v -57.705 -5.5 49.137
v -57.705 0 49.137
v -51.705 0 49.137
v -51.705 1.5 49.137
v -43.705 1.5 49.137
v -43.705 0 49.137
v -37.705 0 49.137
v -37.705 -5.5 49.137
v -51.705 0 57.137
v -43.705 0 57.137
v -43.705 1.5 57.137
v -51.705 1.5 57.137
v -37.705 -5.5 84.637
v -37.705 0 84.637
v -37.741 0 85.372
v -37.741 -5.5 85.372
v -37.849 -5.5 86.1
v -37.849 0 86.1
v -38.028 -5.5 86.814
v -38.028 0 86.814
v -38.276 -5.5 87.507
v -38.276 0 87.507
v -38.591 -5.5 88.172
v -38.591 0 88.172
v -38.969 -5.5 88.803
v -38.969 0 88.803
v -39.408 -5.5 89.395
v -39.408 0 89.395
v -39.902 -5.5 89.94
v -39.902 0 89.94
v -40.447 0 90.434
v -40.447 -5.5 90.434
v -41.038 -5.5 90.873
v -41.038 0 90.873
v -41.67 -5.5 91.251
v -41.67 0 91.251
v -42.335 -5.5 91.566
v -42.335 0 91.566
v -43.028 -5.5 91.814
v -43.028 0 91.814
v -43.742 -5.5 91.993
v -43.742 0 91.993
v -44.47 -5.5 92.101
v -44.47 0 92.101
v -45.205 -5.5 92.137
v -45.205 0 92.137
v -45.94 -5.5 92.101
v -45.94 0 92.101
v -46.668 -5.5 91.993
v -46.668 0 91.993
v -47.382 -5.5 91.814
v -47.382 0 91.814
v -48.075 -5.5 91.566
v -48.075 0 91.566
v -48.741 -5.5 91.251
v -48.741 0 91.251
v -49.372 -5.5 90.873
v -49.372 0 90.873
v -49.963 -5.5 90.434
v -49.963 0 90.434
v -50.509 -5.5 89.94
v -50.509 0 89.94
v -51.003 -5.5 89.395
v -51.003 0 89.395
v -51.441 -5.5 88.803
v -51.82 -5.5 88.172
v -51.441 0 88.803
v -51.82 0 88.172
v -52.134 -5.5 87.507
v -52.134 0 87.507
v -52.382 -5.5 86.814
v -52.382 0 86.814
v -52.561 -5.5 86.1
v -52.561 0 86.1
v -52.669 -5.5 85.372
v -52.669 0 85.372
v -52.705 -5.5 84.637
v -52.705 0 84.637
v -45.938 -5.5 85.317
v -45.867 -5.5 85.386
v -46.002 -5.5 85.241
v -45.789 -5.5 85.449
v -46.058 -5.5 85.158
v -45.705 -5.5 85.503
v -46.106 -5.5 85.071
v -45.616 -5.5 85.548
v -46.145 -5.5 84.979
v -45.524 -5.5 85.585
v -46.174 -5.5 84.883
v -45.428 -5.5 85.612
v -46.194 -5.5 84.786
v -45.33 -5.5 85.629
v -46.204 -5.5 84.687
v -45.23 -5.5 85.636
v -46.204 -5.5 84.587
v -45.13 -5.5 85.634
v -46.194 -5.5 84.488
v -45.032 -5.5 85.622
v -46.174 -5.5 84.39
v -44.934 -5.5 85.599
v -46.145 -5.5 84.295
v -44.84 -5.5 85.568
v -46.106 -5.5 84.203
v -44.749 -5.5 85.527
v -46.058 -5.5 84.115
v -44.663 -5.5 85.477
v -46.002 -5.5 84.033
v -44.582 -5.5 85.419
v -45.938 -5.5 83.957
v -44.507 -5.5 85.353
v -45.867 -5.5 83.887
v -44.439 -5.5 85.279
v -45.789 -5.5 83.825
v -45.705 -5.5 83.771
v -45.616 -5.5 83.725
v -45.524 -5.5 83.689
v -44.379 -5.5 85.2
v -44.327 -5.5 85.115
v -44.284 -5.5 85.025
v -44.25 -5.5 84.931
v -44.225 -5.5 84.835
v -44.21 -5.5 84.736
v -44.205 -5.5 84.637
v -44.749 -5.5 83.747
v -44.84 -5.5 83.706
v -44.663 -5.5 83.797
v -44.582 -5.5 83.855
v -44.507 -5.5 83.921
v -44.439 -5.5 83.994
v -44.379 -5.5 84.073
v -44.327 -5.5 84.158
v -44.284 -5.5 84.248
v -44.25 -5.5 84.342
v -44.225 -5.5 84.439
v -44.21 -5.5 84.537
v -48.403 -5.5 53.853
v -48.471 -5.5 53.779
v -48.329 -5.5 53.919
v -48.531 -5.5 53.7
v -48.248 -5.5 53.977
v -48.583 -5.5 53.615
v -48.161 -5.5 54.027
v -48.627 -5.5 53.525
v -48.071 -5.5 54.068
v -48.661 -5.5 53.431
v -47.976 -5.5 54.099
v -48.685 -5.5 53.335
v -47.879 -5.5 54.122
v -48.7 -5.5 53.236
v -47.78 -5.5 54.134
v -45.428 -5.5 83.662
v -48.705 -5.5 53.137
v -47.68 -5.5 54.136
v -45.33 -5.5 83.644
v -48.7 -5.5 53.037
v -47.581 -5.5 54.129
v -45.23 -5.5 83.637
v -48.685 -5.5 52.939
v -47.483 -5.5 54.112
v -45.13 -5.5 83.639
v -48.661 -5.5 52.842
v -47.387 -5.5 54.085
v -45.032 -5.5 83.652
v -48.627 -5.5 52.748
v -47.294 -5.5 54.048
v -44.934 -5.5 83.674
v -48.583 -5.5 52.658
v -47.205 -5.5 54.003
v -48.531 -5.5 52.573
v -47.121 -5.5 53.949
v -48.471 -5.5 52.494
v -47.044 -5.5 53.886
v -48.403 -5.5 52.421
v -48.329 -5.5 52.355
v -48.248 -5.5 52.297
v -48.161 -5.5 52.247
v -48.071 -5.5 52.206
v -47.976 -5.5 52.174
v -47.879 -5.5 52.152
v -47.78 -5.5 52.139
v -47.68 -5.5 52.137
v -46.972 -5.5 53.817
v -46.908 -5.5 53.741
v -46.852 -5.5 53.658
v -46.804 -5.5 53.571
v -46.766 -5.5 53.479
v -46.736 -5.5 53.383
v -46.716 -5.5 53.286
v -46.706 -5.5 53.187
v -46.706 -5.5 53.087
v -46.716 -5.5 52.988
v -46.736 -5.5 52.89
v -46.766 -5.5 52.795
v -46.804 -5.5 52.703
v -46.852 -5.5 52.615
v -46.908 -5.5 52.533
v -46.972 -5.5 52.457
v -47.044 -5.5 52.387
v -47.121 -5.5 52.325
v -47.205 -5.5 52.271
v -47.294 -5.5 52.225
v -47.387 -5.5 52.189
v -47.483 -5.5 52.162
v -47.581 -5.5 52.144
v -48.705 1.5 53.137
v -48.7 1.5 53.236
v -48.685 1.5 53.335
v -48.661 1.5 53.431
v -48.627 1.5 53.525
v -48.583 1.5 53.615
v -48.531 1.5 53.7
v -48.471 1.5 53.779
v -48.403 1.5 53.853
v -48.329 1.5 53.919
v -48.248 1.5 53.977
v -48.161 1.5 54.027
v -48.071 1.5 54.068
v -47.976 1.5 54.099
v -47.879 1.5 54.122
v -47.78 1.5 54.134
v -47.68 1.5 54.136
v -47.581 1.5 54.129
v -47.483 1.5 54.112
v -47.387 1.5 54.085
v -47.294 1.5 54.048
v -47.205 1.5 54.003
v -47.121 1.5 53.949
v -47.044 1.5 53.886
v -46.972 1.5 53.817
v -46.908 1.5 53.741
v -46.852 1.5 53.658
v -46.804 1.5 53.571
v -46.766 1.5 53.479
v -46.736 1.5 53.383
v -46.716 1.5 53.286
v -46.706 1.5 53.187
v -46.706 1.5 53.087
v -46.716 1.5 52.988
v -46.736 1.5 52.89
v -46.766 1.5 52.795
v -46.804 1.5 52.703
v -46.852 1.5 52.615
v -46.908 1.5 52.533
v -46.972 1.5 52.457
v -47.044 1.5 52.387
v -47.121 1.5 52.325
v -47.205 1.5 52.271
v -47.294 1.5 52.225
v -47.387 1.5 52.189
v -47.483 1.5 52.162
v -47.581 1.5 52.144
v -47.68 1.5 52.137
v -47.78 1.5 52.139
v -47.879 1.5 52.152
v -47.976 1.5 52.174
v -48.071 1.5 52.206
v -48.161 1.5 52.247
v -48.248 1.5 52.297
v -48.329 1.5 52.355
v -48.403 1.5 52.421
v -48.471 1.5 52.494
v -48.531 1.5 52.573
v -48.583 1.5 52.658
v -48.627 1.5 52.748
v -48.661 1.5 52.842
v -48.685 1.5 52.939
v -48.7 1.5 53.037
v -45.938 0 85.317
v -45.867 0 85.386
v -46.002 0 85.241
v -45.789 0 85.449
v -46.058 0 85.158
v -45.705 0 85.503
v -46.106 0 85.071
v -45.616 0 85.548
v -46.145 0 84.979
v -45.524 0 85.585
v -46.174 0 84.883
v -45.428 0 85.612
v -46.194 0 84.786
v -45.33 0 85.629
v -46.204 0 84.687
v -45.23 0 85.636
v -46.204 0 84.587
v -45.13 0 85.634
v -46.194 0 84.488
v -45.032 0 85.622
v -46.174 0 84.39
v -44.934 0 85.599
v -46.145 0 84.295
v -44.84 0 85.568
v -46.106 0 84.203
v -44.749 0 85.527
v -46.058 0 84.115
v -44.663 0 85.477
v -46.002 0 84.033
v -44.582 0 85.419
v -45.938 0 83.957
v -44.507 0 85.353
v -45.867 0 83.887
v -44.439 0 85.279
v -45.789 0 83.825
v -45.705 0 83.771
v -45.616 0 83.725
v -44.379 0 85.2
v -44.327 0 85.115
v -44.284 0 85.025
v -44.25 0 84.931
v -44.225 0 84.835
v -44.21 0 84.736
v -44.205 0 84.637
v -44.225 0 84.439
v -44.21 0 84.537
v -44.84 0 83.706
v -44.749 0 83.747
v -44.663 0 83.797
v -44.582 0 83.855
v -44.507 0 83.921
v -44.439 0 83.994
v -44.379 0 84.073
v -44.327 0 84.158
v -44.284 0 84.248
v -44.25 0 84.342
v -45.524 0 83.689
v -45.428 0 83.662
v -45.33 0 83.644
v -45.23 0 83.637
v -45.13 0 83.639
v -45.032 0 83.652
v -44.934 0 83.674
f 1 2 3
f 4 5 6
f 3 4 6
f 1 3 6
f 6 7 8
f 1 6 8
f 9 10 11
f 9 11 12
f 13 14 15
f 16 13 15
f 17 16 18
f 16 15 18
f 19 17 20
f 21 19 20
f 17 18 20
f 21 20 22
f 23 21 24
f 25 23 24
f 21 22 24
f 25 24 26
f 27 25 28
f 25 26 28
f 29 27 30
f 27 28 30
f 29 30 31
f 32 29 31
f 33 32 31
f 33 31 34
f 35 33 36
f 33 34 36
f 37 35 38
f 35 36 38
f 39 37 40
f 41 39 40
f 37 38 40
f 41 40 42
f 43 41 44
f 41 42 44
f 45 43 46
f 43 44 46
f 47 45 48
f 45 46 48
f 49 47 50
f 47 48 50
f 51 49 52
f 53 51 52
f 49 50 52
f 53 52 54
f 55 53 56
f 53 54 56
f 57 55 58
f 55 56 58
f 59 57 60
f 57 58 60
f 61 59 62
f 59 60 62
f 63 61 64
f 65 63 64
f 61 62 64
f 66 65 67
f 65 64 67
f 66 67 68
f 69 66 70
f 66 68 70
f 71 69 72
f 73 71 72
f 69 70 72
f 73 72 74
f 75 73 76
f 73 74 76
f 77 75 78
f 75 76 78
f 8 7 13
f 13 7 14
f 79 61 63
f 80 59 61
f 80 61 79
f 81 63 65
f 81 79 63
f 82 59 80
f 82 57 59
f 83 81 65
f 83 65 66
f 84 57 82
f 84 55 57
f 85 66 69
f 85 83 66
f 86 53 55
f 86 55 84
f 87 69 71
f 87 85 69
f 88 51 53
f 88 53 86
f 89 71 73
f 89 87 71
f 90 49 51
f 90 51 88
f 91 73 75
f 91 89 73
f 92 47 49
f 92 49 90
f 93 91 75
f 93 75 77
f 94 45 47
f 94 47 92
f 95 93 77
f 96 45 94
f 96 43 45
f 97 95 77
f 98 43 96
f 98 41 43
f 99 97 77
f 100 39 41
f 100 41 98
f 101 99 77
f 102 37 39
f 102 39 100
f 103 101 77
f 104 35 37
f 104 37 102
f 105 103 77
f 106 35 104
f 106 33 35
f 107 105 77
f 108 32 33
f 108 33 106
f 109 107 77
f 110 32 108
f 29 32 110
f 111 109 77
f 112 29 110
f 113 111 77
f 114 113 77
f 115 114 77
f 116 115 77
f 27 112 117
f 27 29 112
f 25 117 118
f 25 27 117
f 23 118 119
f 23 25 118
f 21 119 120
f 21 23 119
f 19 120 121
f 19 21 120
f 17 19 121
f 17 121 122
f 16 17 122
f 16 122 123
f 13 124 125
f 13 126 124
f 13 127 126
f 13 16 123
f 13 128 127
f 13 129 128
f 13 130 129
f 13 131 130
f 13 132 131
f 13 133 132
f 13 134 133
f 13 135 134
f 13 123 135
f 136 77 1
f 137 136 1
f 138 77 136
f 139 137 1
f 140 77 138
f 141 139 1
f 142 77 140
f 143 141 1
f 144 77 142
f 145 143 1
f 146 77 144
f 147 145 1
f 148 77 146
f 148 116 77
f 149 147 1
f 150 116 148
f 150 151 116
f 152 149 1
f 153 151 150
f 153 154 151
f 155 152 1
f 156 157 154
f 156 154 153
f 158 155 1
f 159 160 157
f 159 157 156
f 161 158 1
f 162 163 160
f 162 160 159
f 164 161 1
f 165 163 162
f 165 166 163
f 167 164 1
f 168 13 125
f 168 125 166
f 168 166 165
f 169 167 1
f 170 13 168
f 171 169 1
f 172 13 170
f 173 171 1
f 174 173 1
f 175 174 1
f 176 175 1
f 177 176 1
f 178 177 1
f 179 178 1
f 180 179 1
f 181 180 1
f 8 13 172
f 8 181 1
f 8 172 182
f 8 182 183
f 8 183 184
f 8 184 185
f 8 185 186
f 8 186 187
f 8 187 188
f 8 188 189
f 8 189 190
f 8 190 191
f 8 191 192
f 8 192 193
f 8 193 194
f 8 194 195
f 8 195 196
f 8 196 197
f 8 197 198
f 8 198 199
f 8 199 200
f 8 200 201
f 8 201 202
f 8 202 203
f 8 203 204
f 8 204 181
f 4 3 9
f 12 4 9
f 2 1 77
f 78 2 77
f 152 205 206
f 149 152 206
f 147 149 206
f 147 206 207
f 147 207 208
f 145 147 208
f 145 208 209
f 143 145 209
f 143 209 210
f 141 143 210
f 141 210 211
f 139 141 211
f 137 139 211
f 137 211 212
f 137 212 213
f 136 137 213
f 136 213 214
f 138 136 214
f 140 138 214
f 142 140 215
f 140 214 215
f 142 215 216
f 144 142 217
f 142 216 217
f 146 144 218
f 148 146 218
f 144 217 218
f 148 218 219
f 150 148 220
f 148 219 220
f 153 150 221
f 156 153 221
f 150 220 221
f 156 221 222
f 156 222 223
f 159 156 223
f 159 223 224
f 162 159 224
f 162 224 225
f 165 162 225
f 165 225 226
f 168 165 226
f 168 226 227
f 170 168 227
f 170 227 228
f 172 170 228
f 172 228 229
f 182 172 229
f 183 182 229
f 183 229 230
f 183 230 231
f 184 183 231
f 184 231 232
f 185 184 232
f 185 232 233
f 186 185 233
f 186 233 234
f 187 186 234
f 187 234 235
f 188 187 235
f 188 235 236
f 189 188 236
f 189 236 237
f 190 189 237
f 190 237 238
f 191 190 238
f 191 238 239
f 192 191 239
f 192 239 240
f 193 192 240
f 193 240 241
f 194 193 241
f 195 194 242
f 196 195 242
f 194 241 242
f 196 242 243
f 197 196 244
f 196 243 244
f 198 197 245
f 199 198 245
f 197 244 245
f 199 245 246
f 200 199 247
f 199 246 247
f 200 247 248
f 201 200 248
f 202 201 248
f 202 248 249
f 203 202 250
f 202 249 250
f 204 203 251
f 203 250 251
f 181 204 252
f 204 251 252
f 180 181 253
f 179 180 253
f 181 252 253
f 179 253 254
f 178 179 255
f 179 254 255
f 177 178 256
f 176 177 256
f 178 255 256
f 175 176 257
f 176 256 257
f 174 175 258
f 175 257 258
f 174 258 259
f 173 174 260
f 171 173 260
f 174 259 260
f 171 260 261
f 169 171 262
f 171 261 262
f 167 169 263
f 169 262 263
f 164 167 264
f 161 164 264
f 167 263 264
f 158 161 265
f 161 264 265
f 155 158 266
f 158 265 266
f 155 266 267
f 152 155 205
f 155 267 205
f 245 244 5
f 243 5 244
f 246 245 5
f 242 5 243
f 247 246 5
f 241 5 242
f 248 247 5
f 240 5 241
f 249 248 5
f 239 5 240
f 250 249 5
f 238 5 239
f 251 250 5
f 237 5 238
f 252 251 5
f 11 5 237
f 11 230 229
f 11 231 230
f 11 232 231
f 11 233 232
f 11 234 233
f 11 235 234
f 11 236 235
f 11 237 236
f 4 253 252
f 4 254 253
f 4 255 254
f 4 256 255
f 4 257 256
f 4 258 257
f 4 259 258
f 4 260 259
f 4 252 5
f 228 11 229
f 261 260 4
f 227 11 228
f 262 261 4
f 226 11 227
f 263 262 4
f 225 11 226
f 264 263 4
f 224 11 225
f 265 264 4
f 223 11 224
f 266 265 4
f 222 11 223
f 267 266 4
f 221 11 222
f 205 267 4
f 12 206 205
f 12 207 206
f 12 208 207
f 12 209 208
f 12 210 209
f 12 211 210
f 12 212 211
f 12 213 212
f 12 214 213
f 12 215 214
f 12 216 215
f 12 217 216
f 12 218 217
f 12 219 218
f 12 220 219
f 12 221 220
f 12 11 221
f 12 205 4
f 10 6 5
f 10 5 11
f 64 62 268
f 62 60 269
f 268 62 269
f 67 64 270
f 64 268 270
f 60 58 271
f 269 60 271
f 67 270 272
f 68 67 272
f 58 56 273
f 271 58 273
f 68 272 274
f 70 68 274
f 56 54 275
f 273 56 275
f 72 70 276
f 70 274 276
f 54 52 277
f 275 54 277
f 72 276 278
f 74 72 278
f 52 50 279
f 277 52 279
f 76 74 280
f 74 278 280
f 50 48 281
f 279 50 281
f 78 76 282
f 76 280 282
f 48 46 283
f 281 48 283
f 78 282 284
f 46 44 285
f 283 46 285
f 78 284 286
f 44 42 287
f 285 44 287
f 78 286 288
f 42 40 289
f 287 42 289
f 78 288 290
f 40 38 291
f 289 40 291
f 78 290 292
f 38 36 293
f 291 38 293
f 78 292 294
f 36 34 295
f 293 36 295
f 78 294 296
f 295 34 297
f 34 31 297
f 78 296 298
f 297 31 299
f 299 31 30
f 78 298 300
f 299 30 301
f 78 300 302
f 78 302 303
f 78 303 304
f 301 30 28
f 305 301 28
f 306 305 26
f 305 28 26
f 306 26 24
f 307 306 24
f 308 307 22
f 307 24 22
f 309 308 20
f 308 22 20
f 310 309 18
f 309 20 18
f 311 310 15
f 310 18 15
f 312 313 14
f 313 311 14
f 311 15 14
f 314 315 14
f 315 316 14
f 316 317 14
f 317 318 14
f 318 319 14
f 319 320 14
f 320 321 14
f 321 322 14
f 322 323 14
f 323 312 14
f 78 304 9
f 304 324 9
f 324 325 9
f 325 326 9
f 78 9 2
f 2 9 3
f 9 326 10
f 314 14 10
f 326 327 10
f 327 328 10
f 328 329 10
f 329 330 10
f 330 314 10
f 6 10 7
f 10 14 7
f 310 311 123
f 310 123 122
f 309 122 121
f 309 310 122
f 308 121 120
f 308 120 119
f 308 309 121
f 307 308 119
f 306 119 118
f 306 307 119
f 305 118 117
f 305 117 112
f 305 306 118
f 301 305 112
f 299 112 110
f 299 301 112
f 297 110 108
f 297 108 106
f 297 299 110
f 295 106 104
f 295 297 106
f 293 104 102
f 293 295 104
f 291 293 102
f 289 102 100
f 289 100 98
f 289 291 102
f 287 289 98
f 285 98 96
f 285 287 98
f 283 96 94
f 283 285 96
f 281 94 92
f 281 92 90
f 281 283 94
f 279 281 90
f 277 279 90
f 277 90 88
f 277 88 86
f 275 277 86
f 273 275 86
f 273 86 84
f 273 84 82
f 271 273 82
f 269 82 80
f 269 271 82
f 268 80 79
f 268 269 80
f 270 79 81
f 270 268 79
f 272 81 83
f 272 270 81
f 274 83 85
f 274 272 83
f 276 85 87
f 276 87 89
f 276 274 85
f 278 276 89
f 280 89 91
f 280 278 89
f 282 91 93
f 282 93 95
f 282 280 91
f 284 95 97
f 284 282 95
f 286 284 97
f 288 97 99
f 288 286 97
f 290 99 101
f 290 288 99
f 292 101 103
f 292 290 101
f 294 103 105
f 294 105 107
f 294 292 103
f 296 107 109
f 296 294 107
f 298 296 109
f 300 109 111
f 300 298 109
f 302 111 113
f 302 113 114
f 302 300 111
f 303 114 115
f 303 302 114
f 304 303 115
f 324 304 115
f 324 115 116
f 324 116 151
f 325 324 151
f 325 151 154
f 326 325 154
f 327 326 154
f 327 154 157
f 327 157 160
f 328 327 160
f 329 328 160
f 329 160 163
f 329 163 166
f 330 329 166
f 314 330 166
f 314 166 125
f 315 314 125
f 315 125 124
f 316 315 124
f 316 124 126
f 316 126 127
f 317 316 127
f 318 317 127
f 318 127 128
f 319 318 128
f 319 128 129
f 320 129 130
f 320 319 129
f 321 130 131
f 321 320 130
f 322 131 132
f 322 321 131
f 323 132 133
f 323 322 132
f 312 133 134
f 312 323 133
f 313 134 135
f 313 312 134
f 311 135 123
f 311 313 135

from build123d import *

# Parameters (mm, degrees)
F0_R      = 1
F1_DEPTH  = 5.5
F2_W      = 5.5
F2_H      = 57
F3_DEPTH  = 25
F4_DEPTH  = 5
F6_DEPTH  = 25
F7_W      = 8
F7_H      = 8
F8_DEPTH  = 1.5
F9_R      = 1
F10_DEPTH = 25


with BuildPart() as f1:
    # F0 (on Front) → F1 (new body)
    with BuildSketch(Plane.XZ):
        with BuildLine():
            ThreePointArc((-37.7052051574, 84.6366998268), (-39.9019042985, 89.9400006857), (-45.2052051574, 92.1366998268))
            ThreePointArc((-45.2052051574, 92.1366998268), (-50.5085060163, 89.9400006857), (-52.7052051574, 84.6366998268))
            ThreePointArc((-52.7052051574, 84.6366998268), (-45.2052051574, 77.1366998268), (-37.7052051574, 84.6366998268))
        make_face()
        with Locations((-45.2052051574, 84.6366998268)):
            Circle(F0_R, mode=Mode.SUBTRACT)
        with BuildLine():
            ThreePointArc((-37.7052051574, 84.6366998268), (-45.2052051574, 77.1366998268), (-52.7052051574, 84.6366998268))
            Line((-52.7052051574, 84.6366998268), (-52.7052051574, -7.8633001732))
            Line((-52.7052051574, -7.8633001732), (-37.7052051574, -7.8633001732))
            Line((-37.7052051574, -7.8633001732), (-37.7052051574, 84.6366998268))
        make_face()
    extrude(amount=F1_DEPTH)

    # F2 (on face) → F3 (cut)
    with BuildSketch(Plane(origin=(-52.7052051574, 0, 0), x_dir=(0, -1, 0), z_dir=(-1, 0, 0))):
        with Locations((2.75, 20.6366998268)):
            Rectangle(F2_W, F2_H)
    extrude(amount=-F3_DEPTH, mode=Mode.SUBTRACT)

    # F4 (add): a face of the model
    f4_faces = [f1.faces().sort_by_distance(p)[0] for p in [
        (-52.7052051574, -2.75, 66.8866998268),
    ]]
    extrude(f4_faces, amount=F4_DEPTH)

    # F5 (on face) → F6 (cut)
    with BuildSketch(Plane.XZ.offset(5.5)):
        Polygon((-57.7052051574, 49.1366998268), (-52.7052051574, 84.6366998268), (-57.7052051574, 84.6366998268), align=None)
    extrude(amount=-F6_DEPTH, mode=Mode.SUBTRACT)

    # F7 (on face) → F8 (join)
    with BuildSketch(Plane(origin=(0, 0, 0), x_dir=(-1, 0, 0), z_dir=(0, 1, 0))):
        with Locations((47.7052051574, 53.1366998268)):
            Rectangle(F7_W, F7_H)
    extrude(amount=F8_DEPTH)

    # F9 (on face) → F10 (cut)
    with BuildSketch(Plane(origin=(0, 1.5, 0), x_dir=(-1, 0, 0), z_dir=(0, 1, 0))):
        with Locations((47.7052051574, 53.1366998268)):
            Circle(F9_R)
    extrude(amount=-F10_DEPTH, mode=Mode.SUBTRACT)


solid = f1.part
